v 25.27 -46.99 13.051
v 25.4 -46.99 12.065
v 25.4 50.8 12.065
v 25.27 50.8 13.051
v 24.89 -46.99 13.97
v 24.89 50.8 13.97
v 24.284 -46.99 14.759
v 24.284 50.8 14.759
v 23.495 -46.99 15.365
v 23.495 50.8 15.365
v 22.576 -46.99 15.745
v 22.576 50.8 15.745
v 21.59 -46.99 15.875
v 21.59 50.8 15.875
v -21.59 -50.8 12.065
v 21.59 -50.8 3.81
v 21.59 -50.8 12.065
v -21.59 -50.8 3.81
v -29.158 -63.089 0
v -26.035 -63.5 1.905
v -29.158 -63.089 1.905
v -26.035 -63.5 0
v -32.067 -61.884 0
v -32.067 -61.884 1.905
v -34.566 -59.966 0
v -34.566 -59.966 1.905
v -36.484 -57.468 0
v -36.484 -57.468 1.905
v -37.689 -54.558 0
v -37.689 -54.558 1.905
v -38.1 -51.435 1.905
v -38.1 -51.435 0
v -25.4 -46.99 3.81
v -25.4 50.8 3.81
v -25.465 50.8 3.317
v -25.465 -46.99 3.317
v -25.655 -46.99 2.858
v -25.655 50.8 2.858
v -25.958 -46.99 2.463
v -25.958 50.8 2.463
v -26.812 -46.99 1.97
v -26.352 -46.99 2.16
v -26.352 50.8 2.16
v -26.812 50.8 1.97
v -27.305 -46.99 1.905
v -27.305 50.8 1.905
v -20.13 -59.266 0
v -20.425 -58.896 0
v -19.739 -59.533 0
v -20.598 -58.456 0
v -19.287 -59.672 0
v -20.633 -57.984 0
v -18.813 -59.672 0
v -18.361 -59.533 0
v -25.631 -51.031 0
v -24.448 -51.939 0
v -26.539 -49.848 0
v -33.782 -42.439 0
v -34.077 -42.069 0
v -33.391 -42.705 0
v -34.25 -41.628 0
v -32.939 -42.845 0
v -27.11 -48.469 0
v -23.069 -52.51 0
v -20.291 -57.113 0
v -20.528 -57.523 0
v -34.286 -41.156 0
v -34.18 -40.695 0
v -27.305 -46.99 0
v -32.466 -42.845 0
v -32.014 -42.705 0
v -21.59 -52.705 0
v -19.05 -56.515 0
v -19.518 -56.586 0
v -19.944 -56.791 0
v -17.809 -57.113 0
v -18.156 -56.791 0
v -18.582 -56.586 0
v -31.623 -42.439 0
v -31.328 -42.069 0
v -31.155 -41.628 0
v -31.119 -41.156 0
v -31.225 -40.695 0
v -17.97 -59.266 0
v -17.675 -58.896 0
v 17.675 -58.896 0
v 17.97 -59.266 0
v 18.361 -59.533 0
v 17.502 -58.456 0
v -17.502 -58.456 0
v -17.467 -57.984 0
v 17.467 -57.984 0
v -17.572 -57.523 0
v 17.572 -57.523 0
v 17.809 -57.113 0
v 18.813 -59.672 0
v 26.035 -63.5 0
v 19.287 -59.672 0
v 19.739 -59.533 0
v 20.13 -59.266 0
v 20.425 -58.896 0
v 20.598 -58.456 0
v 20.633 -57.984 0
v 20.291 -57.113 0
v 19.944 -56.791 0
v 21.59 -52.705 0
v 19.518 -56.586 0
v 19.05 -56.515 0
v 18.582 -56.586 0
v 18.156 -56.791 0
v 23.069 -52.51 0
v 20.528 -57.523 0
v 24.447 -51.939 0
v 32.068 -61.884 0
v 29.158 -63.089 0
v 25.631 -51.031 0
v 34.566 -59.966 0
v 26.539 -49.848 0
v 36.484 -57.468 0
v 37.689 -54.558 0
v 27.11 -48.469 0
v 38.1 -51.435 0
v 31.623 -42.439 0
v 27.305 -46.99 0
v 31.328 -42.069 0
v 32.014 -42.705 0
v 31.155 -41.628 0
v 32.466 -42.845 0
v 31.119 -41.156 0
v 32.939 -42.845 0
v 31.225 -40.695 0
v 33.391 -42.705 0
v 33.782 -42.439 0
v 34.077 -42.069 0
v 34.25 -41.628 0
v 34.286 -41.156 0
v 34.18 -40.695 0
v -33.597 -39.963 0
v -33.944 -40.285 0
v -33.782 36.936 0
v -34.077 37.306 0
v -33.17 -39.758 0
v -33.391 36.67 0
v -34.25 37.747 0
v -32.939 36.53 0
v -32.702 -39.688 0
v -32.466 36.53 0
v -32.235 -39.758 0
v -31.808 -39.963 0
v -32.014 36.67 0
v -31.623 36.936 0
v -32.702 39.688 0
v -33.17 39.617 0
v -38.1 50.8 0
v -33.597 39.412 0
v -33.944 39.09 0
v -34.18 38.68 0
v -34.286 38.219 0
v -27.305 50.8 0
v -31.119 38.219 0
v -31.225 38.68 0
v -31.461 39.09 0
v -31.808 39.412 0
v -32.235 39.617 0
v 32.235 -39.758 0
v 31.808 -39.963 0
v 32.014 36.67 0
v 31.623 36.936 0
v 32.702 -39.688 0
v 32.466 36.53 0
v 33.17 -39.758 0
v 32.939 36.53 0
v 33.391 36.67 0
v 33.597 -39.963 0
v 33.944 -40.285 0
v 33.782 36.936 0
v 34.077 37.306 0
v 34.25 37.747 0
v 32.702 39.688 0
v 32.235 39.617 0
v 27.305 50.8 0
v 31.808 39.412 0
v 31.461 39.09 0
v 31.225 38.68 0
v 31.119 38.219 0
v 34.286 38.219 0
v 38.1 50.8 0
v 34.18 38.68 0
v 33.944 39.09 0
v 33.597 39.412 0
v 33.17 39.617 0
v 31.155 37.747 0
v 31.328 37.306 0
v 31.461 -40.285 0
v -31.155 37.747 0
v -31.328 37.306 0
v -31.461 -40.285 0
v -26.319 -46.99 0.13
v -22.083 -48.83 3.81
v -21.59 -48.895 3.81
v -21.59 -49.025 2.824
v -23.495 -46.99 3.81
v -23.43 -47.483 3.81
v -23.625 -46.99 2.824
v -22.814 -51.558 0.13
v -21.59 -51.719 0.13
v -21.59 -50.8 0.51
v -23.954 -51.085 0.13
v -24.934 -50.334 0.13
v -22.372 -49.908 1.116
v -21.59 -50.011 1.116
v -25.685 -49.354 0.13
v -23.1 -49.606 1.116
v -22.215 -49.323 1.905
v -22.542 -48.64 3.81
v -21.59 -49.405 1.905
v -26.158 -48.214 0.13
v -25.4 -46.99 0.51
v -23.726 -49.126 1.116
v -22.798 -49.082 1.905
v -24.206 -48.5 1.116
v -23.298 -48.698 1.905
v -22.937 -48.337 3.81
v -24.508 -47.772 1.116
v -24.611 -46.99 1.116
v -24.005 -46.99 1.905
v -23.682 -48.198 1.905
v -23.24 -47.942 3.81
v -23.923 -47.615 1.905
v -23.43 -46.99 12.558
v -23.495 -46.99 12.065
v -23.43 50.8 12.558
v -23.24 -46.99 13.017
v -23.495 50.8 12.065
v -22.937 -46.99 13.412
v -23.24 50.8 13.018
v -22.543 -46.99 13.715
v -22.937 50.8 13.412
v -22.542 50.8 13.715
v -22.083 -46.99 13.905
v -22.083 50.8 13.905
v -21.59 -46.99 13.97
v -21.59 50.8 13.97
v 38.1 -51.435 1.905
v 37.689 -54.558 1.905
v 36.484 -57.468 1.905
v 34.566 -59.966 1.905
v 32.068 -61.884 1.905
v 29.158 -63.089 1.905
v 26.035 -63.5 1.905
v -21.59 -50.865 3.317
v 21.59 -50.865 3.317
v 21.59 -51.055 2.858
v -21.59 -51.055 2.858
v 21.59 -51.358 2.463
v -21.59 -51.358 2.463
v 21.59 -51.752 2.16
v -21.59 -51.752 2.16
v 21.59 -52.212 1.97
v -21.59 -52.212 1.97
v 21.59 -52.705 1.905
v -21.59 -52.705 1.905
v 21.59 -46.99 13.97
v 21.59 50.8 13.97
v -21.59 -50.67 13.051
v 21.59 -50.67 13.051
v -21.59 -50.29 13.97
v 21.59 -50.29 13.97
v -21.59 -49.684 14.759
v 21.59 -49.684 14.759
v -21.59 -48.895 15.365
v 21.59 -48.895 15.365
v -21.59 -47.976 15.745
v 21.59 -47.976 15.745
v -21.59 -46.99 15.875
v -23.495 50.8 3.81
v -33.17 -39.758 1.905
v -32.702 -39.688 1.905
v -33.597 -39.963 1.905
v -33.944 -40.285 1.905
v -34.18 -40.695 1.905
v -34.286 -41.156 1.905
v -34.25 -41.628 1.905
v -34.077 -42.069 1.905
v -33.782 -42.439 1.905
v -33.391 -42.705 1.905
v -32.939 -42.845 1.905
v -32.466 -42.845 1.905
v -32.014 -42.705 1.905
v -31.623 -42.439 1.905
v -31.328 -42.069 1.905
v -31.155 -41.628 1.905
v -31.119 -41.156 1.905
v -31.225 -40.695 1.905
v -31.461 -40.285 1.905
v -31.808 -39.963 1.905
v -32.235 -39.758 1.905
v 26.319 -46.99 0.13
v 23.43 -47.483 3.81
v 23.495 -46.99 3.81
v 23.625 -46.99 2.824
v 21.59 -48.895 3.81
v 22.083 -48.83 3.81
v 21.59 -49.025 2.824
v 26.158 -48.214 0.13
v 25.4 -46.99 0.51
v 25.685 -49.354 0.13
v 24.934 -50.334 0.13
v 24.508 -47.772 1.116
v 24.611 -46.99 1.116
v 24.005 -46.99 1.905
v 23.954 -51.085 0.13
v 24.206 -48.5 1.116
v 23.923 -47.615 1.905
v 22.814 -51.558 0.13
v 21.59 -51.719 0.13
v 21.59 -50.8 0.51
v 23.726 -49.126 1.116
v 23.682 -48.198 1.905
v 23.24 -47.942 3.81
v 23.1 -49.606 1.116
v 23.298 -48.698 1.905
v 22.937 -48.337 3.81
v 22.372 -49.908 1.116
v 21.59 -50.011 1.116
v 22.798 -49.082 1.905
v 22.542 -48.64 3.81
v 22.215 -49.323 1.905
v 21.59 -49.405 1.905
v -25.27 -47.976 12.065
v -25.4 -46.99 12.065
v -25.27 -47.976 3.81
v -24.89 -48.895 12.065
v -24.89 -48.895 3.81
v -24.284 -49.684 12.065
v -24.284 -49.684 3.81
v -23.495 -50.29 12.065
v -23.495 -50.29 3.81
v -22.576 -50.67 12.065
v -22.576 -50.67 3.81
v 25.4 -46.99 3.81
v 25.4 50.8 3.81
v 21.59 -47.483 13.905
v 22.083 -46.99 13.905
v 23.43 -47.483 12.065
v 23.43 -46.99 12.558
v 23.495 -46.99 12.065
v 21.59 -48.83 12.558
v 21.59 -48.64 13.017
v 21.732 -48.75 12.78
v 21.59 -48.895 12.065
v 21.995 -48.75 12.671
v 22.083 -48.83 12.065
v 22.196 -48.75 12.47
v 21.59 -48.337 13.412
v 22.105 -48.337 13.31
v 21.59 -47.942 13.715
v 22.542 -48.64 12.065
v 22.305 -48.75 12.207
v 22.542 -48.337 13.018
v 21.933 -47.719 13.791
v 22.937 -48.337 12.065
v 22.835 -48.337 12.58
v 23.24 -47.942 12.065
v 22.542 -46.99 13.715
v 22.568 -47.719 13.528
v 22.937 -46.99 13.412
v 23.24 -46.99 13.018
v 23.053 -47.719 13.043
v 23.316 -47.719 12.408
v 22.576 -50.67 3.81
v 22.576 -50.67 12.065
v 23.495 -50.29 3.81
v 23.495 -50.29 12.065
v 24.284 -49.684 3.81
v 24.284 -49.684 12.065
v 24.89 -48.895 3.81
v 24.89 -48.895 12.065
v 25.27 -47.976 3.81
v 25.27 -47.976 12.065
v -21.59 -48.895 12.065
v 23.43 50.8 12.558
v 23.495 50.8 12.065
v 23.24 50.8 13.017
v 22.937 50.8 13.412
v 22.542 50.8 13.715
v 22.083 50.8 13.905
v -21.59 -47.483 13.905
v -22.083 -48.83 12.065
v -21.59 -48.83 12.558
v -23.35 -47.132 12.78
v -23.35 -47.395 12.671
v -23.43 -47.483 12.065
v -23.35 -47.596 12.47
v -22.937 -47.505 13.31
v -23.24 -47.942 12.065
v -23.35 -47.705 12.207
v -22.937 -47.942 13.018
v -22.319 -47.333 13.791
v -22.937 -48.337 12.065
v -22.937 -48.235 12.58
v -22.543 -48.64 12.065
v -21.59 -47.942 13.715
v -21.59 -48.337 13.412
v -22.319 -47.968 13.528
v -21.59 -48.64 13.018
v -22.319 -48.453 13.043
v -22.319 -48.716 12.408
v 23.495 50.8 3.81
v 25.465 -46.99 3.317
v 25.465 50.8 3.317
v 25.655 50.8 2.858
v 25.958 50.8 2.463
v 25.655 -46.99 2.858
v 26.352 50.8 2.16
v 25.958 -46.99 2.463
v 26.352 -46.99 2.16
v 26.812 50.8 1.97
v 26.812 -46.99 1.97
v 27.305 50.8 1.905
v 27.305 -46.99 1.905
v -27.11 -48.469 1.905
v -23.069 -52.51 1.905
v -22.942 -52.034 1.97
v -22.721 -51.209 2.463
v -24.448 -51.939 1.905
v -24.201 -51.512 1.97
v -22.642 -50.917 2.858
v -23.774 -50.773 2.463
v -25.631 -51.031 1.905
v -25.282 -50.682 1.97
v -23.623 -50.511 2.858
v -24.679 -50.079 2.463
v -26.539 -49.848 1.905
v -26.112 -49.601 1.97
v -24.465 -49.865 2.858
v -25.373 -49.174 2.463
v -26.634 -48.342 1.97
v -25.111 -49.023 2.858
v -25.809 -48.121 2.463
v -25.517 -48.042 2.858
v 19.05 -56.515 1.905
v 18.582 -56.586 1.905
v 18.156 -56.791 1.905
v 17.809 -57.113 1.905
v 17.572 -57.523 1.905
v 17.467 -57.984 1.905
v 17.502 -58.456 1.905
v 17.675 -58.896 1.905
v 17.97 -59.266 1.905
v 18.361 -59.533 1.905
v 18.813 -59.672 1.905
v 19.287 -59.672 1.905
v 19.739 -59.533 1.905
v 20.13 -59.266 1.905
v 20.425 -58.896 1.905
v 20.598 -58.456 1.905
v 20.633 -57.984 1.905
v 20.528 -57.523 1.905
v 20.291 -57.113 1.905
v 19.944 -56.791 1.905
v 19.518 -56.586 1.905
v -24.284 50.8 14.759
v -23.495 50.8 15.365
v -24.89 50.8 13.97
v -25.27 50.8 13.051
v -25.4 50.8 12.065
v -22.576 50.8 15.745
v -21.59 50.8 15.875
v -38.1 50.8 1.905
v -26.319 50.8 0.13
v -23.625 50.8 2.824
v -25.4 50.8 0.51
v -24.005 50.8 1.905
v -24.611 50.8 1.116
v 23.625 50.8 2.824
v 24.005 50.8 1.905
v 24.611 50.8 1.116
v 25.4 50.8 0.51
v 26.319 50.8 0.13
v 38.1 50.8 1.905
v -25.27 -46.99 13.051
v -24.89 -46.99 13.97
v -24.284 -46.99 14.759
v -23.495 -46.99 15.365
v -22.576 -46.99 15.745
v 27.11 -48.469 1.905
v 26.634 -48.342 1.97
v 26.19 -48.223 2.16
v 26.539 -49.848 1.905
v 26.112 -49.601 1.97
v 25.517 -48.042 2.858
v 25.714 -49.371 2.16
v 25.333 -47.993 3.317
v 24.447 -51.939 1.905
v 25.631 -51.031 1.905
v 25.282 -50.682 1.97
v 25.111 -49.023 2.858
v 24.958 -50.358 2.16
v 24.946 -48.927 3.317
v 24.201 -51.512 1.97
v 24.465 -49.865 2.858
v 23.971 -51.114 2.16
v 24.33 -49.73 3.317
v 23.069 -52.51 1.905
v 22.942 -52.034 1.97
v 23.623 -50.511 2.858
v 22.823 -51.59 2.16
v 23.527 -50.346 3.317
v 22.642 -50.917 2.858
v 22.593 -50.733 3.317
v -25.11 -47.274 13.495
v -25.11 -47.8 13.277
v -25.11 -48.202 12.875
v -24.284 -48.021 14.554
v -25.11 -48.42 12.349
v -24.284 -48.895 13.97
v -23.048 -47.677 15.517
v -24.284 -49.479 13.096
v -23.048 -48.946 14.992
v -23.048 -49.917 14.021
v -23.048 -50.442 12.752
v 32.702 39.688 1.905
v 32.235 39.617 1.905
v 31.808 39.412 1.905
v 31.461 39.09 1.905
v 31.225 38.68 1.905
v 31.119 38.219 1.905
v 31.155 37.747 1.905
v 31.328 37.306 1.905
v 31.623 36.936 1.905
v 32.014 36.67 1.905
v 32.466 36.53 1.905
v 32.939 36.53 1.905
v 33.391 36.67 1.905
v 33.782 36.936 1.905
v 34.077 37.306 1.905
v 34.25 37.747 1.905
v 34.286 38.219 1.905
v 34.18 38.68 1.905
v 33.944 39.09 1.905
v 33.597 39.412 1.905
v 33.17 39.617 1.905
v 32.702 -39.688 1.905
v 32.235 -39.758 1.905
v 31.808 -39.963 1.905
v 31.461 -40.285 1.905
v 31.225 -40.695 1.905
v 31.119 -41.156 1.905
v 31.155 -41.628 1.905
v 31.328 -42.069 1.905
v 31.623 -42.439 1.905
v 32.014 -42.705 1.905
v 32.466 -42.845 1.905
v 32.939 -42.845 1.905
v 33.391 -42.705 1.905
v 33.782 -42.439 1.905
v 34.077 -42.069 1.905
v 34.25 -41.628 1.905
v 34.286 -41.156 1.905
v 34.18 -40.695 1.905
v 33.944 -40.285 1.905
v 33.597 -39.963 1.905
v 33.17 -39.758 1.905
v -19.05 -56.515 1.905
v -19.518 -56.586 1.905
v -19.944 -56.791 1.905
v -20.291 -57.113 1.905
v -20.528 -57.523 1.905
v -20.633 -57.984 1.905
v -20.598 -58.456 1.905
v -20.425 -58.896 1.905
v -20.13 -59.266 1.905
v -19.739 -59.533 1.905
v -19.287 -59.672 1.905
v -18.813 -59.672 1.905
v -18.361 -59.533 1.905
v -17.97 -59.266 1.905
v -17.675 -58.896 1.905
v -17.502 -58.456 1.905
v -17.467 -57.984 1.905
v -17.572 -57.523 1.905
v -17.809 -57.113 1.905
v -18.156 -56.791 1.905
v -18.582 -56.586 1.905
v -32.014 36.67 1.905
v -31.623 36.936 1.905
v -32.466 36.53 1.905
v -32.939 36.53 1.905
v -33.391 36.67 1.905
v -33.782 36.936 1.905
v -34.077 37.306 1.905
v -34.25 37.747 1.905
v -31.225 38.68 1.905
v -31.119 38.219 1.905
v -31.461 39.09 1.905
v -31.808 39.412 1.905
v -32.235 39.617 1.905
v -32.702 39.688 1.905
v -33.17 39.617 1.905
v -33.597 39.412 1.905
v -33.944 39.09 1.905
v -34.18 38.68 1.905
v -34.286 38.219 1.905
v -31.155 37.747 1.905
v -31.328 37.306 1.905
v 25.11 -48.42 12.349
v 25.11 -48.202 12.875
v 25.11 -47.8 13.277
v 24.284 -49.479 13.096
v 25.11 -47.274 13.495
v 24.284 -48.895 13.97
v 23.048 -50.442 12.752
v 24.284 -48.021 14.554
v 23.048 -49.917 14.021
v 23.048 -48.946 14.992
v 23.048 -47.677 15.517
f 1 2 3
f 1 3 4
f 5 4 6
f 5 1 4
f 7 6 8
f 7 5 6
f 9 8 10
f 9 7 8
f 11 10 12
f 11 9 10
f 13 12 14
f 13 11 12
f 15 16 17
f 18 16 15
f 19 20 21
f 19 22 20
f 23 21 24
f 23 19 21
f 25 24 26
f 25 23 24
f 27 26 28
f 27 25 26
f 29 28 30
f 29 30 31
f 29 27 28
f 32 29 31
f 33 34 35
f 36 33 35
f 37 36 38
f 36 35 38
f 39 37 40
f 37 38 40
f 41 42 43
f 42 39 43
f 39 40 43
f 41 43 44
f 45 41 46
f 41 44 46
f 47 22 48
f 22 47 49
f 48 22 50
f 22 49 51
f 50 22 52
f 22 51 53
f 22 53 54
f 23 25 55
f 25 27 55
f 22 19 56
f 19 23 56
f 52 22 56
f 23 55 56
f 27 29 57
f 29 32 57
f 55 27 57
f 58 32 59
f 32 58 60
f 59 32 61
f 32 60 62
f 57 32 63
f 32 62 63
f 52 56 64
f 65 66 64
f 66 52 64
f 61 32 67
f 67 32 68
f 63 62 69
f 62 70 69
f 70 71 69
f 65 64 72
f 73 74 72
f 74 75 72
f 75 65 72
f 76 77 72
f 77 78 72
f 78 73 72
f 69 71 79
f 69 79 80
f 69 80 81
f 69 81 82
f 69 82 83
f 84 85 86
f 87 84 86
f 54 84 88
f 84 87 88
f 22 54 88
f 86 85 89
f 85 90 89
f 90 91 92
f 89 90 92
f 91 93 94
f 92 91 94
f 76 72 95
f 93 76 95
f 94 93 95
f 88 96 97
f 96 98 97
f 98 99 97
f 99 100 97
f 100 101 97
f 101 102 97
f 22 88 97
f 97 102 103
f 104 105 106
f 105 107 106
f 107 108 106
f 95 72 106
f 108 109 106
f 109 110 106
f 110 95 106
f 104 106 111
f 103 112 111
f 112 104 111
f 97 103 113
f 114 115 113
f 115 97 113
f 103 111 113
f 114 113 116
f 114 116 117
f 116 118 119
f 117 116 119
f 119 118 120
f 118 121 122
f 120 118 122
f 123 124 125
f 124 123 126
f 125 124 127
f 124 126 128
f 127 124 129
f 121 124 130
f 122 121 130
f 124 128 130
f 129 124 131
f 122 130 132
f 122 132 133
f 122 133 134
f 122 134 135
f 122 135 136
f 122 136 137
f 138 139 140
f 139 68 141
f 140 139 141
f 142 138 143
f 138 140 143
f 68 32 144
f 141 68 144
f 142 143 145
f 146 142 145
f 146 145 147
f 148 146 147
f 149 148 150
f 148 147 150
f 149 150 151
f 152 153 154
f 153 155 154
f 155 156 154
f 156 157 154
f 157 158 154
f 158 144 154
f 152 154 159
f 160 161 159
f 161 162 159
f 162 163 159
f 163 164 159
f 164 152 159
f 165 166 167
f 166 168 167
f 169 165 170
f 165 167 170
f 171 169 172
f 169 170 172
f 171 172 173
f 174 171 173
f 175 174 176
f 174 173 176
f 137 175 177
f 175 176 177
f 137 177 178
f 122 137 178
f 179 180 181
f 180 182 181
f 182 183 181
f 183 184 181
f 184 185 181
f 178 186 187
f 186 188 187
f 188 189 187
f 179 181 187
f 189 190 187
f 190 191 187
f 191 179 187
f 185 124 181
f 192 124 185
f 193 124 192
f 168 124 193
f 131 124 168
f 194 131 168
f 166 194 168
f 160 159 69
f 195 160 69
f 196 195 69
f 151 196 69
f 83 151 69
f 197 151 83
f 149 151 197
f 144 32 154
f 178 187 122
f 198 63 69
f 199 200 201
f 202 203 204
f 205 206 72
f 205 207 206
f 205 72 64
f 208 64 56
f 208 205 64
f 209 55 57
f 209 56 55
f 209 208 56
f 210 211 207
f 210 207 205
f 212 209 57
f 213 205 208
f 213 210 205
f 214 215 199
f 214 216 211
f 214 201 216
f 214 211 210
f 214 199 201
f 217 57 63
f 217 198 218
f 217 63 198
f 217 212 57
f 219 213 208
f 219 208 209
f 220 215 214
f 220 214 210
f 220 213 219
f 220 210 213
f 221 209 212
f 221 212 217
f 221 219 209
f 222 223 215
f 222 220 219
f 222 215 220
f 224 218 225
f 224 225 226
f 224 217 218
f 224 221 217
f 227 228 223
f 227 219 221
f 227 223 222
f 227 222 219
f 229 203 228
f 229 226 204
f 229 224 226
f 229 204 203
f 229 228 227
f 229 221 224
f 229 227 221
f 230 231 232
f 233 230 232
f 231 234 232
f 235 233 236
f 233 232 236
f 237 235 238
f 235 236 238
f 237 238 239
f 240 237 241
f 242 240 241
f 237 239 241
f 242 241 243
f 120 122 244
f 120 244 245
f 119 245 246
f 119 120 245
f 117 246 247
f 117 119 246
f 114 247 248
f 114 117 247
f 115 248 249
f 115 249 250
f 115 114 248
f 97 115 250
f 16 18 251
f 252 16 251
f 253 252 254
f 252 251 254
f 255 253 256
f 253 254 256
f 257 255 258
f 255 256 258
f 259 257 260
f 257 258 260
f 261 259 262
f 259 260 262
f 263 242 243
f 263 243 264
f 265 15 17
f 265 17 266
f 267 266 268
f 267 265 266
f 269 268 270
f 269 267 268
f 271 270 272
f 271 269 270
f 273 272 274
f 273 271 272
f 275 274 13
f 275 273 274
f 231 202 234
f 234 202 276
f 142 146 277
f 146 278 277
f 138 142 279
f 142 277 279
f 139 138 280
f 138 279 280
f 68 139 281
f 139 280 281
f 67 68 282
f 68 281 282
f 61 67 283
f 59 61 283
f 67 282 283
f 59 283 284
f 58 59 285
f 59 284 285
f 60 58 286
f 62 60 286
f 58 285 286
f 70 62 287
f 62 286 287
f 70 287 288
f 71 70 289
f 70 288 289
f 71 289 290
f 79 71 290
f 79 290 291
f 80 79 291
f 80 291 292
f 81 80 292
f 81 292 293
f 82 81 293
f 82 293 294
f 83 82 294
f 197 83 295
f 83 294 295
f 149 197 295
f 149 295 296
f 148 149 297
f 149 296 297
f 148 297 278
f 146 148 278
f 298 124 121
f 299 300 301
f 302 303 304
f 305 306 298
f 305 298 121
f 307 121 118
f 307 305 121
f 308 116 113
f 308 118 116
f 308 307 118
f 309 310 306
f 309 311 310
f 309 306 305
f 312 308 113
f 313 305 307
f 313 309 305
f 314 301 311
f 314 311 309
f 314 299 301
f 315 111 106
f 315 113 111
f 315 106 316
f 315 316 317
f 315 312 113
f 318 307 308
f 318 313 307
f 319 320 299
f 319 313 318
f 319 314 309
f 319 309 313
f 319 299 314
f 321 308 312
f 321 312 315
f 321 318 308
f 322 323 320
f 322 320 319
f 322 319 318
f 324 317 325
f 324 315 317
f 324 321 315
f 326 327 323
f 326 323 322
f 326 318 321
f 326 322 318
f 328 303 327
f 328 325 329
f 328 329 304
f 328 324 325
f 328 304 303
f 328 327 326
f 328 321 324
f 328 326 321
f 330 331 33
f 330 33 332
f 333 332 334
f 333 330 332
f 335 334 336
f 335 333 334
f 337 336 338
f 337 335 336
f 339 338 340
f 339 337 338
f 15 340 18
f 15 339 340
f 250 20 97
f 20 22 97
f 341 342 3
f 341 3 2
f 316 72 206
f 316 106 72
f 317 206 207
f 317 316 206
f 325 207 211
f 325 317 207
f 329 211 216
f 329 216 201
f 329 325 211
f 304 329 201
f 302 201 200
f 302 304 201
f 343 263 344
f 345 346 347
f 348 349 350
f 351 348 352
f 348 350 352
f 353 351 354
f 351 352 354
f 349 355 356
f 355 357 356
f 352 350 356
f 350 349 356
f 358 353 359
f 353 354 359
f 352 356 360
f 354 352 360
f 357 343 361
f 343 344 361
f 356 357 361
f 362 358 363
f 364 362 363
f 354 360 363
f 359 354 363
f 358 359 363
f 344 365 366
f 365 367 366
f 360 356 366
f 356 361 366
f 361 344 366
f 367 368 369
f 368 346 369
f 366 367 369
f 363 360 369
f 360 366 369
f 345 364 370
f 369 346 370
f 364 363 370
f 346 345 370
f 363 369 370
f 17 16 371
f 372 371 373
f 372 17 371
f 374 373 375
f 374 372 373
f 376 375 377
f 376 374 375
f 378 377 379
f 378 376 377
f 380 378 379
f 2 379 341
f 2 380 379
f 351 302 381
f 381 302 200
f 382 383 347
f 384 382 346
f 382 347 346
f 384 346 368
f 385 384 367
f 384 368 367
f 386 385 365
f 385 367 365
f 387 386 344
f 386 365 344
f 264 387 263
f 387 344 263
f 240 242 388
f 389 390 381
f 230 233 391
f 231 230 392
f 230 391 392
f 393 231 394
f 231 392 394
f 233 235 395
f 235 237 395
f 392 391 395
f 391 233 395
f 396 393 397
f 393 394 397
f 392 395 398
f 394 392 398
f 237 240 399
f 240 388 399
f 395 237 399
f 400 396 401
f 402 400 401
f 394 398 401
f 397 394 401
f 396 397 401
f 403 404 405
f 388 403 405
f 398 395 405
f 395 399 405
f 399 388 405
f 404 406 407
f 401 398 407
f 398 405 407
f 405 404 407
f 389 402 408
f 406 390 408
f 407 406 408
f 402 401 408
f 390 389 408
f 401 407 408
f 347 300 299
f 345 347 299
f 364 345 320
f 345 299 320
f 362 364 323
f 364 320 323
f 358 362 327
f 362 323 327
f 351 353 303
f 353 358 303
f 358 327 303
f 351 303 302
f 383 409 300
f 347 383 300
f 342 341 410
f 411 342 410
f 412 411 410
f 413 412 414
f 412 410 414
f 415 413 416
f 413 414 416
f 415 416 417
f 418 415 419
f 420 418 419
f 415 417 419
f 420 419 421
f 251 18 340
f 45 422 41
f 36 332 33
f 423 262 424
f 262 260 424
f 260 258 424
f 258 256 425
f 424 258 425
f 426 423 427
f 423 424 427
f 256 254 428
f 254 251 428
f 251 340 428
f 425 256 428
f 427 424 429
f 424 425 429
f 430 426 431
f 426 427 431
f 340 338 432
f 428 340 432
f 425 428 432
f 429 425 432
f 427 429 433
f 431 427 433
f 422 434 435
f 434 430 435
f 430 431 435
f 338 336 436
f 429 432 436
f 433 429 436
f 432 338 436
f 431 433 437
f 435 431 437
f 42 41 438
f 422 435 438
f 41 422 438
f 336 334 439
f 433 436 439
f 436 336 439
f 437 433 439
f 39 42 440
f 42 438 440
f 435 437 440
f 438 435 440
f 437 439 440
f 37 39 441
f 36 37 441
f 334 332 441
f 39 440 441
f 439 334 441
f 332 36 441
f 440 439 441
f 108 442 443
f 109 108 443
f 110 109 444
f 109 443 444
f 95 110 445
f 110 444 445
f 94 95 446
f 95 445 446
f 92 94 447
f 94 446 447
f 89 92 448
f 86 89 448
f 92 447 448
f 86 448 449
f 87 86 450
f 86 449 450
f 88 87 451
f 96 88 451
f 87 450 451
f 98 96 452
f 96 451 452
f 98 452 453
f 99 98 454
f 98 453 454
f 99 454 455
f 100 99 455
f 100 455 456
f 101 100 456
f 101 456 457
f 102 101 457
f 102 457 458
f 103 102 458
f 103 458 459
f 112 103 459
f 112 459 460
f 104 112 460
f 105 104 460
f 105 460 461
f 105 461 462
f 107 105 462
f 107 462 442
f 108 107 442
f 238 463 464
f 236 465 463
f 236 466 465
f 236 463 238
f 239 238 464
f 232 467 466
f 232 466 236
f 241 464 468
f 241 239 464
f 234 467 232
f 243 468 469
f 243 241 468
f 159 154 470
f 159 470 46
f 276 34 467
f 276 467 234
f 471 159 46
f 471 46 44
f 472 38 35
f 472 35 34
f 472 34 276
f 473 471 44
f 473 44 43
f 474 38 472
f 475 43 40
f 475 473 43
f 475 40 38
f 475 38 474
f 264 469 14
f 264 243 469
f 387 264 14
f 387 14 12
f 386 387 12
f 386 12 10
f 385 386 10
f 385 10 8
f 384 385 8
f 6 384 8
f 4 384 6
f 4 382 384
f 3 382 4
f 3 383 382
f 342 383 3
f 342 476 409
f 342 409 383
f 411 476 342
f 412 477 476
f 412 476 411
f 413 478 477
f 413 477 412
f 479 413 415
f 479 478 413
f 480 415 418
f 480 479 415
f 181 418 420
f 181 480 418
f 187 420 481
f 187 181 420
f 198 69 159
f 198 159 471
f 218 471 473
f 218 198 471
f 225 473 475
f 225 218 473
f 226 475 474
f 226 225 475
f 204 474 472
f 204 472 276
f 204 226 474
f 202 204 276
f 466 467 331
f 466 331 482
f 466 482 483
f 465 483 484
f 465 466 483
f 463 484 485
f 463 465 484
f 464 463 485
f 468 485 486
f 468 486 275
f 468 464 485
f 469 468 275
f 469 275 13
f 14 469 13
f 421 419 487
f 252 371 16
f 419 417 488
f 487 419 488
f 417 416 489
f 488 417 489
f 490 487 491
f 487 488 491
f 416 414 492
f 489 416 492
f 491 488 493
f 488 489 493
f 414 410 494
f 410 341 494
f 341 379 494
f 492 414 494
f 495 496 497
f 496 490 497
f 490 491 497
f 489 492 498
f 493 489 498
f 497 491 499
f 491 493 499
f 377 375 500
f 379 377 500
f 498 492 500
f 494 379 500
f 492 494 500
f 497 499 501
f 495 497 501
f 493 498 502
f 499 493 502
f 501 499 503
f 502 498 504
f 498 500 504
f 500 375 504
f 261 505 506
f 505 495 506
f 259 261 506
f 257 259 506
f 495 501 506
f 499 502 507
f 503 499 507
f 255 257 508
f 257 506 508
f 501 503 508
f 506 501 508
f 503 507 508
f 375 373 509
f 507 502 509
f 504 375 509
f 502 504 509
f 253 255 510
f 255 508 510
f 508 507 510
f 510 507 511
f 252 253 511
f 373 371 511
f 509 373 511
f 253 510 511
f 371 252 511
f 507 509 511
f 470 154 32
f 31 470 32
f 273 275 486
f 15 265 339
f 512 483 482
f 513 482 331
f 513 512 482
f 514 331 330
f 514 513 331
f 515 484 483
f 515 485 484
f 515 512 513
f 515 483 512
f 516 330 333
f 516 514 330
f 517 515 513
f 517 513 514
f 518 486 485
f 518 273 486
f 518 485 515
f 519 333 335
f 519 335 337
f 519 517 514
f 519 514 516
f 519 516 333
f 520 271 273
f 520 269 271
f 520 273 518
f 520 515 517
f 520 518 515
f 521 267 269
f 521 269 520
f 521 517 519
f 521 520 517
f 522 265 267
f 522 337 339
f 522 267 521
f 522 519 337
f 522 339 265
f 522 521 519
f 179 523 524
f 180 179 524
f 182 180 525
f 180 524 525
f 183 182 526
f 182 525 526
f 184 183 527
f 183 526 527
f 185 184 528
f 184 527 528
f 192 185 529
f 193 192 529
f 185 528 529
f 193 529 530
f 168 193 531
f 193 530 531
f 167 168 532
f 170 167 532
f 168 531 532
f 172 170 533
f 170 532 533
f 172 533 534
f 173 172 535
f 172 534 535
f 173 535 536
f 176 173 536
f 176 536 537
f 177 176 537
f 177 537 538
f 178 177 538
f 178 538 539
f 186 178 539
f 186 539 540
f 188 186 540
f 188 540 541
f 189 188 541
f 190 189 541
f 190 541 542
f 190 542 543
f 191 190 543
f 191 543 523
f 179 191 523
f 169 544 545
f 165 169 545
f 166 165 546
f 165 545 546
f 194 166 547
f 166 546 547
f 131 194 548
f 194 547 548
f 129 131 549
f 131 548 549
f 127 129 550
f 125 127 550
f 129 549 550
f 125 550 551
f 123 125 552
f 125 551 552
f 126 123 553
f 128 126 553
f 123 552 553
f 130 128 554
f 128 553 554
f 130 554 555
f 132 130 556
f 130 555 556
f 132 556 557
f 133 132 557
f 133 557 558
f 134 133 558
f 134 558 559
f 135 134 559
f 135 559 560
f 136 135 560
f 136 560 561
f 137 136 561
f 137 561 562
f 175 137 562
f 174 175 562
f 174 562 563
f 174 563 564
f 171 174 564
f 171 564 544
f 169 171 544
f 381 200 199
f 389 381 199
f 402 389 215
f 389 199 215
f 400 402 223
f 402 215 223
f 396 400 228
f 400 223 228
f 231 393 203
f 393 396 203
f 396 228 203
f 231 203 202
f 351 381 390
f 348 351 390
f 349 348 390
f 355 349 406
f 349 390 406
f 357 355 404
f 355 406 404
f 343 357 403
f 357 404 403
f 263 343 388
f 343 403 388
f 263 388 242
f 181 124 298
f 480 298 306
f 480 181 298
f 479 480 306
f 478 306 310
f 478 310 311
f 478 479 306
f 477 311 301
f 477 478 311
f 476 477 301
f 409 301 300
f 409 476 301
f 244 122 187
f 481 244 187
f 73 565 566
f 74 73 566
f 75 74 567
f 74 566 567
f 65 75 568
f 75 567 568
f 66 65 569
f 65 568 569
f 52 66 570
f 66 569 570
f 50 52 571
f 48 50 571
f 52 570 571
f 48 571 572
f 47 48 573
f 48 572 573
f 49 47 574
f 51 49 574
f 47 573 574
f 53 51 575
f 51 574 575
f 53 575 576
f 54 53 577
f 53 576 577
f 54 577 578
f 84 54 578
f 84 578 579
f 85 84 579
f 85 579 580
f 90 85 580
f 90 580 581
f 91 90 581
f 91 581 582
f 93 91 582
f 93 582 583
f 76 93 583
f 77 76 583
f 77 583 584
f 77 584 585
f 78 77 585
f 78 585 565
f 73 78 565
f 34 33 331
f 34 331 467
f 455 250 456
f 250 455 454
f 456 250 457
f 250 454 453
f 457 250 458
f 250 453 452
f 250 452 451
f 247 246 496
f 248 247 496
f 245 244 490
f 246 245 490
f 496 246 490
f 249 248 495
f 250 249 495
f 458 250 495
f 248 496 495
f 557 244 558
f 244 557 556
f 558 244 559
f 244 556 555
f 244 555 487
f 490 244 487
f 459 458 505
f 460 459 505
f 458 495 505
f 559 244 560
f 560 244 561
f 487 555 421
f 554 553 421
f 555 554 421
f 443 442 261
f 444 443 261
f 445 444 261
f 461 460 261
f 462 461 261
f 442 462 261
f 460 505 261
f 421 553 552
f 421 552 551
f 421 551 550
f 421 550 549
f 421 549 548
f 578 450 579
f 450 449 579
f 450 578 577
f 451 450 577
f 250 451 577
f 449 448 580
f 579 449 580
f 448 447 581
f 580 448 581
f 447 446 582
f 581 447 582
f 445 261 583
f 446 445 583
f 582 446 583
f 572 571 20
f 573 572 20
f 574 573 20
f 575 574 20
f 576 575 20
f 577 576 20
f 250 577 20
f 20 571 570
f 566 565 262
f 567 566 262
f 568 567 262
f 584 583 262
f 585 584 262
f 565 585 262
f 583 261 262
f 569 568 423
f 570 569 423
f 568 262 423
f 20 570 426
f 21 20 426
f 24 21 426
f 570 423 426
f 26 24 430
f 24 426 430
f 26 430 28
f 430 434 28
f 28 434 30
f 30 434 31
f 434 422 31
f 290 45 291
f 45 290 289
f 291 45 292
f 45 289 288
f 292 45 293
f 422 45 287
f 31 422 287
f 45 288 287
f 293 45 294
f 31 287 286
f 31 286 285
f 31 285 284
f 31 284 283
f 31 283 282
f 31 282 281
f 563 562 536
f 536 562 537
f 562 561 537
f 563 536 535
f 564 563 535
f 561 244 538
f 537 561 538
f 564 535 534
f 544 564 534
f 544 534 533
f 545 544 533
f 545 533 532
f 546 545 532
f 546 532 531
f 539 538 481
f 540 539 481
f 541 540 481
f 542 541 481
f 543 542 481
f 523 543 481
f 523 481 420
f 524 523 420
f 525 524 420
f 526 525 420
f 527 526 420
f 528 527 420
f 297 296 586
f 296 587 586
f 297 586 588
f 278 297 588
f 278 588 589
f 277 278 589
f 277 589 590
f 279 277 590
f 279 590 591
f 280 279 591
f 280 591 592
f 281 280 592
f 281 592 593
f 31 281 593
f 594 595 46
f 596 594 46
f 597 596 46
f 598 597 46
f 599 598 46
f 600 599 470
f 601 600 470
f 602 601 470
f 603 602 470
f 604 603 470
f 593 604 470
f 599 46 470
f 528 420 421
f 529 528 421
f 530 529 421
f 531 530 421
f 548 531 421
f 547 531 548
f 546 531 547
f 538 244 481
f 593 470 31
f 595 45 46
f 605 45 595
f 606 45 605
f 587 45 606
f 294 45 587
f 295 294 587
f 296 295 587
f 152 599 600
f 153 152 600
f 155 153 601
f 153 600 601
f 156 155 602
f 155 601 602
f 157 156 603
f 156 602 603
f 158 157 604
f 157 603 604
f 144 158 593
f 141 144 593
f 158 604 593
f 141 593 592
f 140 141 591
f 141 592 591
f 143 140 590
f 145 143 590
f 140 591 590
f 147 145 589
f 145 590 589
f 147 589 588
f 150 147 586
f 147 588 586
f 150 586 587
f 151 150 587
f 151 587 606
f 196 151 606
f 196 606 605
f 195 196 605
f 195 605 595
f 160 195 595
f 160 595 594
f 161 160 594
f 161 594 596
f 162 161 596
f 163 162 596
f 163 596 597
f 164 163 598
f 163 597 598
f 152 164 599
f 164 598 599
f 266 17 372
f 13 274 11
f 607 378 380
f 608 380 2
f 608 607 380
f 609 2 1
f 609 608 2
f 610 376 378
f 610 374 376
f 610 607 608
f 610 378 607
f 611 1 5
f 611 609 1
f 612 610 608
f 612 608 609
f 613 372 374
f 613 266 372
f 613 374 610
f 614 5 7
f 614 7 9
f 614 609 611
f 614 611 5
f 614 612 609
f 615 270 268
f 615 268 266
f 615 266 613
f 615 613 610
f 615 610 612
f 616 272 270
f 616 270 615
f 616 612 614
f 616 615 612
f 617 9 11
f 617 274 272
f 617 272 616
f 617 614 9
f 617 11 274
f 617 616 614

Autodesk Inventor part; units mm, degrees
ref_plane "YZ Plane" through (0, 0, 0) normal (1, 0, 0) x (0, 1, 0)
ref_plane "XZ Plane" through (0, 0, 0) normal (0, 1, 0) x (-1, 0, 0)
ref_plane "XY Plane" through (0, 0, 0) normal (0, 0, 1) x (1, 0, 0)
sketch "Sketch1" plane through (0, 0, 0) normal (0, 0, 1) x (1, 0, 0)
  line L0 (-25.4, 50.8) -> (25.4, 50.8)
  line L1 (25.4, 50.8) -> (25.4, -50.8)
  line L2 (25.4, -50.8) -> (-25.4, -50.8)
  line L3 (-25.4, -50.8) -> (-25.4, 50.8)
  point P0 (0, 0)
  point P1 (0, 50.8)
  point P2 (-25.4, 0)
  dimension "Width" = 50.8
  dimension "Height" = 101.6
extrude "Extrusion1" add sketch "Sketch1" along normal blind 15.875
shell "Shell1" thickness 1.905 removed faces 2 at (-8.4667, 50.8, 5.2917) at (-8.4667, 16.9333, 0)
sketch "Sketch2" plane through (0, 0, 0) normal (0, 0, -1) x (-1, 0, 0)
  line L0 (-25.4, 50.8) -> (-25.4, -50.8) projected
  line L1 (25.4, -50.8) -> (25.4, 50.8) projected
  line L2 (-25.4, -50.8) -> (25.4, -50.8) projected
  line L3 (25.4, 50.8) -> (38.1, 50.8)
  line L4 (38.1, 50.8) -> (38.1, -51.435)
  arc A0 (26.035, -63.5) -> (38.1, -51.435) centre (26.035, -51.435) ccw
  line L5 (26.035, -63.5) -> (-26.035, -63.5)
  arc A1 (-38.1, -51.435) -> (-26.035, -63.5) centre (-26.035, -51.435) ccw
  line L6 (-38.1, -51.435) -> (-38.1, 50.8)
  line L7 (-38.1, 50.8) -> (-25.4, 50.8)
  dimension "d5" = 12.7
  dimension "d6" = 12.7
  dimension "d7" = 12.065
extrude "Extrusion2" add sketch "Sketch2" against normal blind 1.905
fillet "Fillet1" radius 1.905 8 edges at (23.495, 0.9525, 13.97) (0, -48.895, 13.97) (23.495, -48.895, 6.985) (-23.495, -48.895, 6.985) (-23.495, 0.9525, 13.97) (-25.4, 0, 1.905) (0, -50.8, 1.905) (25.4, 0, 1.905)
fillet "Fillet1" radius 3.81 8 edges at (0, -50.8, 15.875) (25.4, 0, 15.875) (-25.4, 0, 15.875) (-25.4, -50.8, 8.89) (25.4, -50.8, 8.89) (-23.495, 0.9525, 0) (0, -48.895, 0) (23.495, 0.9525, 0)
sketch "Sketch3" plane through (0, 0, 0) normal (0, 0, -1) x (-1, 0, 0)
  line L0 (-27.305, 50.8) -> (-38.1, 50.8) projected
  arc A0 (-38.1, -51.435) -> (-26.035, -63.5) centre (-26.035, -51.435) ccw projected
  line L1 (-38.1, -51.435) -> (-38.1, 50.8) projected
  line L2 (26.035, -63.5) -> (-26.035, -63.5) projected
  line L3 (0, -63.5) -> (0, -52.705) construction
  line L4 (-21.59, -52.705) -> (21.59, -52.705) construction
  line L5 (0, -89.3585) -> (0, 74.1597) construction
  point P0 (-32.7025, 38.1)
  point P1 (-32.7025, -41.275)
  point P2 (-19.05, -58.1025)
  point P3 (-32.7025, 50.8)
  point P4 (-32.7025, 50.8)
  point P5 (0, -58.1025)
  point P6 (32.7025, 38.1)
  point P7 (32.7025, -41.275)
  point P8 (19.05, -58.1025)
  dimension "d13" = 19.05
  dimension "d14" = 22.225
  dimension "d15" = 12.7
hole "Hole1" at (32.7025, 38.1, 0) at (32.7025, -41.275, 0) at (19.05, -58.1025, 0) at (-32.7025, 38.1, 0) at (-32.7025, -41.275, 0) at (-19.05, -58.1025, 0) direction (0, 0, 1) diameter 3.175 end through all clearance for "Flat Head Machine Screw (82)" size "#4" standard "Ansi Unified Screw Threads"
properties part number "M178-4001-03" material "Plastic, Clear"
